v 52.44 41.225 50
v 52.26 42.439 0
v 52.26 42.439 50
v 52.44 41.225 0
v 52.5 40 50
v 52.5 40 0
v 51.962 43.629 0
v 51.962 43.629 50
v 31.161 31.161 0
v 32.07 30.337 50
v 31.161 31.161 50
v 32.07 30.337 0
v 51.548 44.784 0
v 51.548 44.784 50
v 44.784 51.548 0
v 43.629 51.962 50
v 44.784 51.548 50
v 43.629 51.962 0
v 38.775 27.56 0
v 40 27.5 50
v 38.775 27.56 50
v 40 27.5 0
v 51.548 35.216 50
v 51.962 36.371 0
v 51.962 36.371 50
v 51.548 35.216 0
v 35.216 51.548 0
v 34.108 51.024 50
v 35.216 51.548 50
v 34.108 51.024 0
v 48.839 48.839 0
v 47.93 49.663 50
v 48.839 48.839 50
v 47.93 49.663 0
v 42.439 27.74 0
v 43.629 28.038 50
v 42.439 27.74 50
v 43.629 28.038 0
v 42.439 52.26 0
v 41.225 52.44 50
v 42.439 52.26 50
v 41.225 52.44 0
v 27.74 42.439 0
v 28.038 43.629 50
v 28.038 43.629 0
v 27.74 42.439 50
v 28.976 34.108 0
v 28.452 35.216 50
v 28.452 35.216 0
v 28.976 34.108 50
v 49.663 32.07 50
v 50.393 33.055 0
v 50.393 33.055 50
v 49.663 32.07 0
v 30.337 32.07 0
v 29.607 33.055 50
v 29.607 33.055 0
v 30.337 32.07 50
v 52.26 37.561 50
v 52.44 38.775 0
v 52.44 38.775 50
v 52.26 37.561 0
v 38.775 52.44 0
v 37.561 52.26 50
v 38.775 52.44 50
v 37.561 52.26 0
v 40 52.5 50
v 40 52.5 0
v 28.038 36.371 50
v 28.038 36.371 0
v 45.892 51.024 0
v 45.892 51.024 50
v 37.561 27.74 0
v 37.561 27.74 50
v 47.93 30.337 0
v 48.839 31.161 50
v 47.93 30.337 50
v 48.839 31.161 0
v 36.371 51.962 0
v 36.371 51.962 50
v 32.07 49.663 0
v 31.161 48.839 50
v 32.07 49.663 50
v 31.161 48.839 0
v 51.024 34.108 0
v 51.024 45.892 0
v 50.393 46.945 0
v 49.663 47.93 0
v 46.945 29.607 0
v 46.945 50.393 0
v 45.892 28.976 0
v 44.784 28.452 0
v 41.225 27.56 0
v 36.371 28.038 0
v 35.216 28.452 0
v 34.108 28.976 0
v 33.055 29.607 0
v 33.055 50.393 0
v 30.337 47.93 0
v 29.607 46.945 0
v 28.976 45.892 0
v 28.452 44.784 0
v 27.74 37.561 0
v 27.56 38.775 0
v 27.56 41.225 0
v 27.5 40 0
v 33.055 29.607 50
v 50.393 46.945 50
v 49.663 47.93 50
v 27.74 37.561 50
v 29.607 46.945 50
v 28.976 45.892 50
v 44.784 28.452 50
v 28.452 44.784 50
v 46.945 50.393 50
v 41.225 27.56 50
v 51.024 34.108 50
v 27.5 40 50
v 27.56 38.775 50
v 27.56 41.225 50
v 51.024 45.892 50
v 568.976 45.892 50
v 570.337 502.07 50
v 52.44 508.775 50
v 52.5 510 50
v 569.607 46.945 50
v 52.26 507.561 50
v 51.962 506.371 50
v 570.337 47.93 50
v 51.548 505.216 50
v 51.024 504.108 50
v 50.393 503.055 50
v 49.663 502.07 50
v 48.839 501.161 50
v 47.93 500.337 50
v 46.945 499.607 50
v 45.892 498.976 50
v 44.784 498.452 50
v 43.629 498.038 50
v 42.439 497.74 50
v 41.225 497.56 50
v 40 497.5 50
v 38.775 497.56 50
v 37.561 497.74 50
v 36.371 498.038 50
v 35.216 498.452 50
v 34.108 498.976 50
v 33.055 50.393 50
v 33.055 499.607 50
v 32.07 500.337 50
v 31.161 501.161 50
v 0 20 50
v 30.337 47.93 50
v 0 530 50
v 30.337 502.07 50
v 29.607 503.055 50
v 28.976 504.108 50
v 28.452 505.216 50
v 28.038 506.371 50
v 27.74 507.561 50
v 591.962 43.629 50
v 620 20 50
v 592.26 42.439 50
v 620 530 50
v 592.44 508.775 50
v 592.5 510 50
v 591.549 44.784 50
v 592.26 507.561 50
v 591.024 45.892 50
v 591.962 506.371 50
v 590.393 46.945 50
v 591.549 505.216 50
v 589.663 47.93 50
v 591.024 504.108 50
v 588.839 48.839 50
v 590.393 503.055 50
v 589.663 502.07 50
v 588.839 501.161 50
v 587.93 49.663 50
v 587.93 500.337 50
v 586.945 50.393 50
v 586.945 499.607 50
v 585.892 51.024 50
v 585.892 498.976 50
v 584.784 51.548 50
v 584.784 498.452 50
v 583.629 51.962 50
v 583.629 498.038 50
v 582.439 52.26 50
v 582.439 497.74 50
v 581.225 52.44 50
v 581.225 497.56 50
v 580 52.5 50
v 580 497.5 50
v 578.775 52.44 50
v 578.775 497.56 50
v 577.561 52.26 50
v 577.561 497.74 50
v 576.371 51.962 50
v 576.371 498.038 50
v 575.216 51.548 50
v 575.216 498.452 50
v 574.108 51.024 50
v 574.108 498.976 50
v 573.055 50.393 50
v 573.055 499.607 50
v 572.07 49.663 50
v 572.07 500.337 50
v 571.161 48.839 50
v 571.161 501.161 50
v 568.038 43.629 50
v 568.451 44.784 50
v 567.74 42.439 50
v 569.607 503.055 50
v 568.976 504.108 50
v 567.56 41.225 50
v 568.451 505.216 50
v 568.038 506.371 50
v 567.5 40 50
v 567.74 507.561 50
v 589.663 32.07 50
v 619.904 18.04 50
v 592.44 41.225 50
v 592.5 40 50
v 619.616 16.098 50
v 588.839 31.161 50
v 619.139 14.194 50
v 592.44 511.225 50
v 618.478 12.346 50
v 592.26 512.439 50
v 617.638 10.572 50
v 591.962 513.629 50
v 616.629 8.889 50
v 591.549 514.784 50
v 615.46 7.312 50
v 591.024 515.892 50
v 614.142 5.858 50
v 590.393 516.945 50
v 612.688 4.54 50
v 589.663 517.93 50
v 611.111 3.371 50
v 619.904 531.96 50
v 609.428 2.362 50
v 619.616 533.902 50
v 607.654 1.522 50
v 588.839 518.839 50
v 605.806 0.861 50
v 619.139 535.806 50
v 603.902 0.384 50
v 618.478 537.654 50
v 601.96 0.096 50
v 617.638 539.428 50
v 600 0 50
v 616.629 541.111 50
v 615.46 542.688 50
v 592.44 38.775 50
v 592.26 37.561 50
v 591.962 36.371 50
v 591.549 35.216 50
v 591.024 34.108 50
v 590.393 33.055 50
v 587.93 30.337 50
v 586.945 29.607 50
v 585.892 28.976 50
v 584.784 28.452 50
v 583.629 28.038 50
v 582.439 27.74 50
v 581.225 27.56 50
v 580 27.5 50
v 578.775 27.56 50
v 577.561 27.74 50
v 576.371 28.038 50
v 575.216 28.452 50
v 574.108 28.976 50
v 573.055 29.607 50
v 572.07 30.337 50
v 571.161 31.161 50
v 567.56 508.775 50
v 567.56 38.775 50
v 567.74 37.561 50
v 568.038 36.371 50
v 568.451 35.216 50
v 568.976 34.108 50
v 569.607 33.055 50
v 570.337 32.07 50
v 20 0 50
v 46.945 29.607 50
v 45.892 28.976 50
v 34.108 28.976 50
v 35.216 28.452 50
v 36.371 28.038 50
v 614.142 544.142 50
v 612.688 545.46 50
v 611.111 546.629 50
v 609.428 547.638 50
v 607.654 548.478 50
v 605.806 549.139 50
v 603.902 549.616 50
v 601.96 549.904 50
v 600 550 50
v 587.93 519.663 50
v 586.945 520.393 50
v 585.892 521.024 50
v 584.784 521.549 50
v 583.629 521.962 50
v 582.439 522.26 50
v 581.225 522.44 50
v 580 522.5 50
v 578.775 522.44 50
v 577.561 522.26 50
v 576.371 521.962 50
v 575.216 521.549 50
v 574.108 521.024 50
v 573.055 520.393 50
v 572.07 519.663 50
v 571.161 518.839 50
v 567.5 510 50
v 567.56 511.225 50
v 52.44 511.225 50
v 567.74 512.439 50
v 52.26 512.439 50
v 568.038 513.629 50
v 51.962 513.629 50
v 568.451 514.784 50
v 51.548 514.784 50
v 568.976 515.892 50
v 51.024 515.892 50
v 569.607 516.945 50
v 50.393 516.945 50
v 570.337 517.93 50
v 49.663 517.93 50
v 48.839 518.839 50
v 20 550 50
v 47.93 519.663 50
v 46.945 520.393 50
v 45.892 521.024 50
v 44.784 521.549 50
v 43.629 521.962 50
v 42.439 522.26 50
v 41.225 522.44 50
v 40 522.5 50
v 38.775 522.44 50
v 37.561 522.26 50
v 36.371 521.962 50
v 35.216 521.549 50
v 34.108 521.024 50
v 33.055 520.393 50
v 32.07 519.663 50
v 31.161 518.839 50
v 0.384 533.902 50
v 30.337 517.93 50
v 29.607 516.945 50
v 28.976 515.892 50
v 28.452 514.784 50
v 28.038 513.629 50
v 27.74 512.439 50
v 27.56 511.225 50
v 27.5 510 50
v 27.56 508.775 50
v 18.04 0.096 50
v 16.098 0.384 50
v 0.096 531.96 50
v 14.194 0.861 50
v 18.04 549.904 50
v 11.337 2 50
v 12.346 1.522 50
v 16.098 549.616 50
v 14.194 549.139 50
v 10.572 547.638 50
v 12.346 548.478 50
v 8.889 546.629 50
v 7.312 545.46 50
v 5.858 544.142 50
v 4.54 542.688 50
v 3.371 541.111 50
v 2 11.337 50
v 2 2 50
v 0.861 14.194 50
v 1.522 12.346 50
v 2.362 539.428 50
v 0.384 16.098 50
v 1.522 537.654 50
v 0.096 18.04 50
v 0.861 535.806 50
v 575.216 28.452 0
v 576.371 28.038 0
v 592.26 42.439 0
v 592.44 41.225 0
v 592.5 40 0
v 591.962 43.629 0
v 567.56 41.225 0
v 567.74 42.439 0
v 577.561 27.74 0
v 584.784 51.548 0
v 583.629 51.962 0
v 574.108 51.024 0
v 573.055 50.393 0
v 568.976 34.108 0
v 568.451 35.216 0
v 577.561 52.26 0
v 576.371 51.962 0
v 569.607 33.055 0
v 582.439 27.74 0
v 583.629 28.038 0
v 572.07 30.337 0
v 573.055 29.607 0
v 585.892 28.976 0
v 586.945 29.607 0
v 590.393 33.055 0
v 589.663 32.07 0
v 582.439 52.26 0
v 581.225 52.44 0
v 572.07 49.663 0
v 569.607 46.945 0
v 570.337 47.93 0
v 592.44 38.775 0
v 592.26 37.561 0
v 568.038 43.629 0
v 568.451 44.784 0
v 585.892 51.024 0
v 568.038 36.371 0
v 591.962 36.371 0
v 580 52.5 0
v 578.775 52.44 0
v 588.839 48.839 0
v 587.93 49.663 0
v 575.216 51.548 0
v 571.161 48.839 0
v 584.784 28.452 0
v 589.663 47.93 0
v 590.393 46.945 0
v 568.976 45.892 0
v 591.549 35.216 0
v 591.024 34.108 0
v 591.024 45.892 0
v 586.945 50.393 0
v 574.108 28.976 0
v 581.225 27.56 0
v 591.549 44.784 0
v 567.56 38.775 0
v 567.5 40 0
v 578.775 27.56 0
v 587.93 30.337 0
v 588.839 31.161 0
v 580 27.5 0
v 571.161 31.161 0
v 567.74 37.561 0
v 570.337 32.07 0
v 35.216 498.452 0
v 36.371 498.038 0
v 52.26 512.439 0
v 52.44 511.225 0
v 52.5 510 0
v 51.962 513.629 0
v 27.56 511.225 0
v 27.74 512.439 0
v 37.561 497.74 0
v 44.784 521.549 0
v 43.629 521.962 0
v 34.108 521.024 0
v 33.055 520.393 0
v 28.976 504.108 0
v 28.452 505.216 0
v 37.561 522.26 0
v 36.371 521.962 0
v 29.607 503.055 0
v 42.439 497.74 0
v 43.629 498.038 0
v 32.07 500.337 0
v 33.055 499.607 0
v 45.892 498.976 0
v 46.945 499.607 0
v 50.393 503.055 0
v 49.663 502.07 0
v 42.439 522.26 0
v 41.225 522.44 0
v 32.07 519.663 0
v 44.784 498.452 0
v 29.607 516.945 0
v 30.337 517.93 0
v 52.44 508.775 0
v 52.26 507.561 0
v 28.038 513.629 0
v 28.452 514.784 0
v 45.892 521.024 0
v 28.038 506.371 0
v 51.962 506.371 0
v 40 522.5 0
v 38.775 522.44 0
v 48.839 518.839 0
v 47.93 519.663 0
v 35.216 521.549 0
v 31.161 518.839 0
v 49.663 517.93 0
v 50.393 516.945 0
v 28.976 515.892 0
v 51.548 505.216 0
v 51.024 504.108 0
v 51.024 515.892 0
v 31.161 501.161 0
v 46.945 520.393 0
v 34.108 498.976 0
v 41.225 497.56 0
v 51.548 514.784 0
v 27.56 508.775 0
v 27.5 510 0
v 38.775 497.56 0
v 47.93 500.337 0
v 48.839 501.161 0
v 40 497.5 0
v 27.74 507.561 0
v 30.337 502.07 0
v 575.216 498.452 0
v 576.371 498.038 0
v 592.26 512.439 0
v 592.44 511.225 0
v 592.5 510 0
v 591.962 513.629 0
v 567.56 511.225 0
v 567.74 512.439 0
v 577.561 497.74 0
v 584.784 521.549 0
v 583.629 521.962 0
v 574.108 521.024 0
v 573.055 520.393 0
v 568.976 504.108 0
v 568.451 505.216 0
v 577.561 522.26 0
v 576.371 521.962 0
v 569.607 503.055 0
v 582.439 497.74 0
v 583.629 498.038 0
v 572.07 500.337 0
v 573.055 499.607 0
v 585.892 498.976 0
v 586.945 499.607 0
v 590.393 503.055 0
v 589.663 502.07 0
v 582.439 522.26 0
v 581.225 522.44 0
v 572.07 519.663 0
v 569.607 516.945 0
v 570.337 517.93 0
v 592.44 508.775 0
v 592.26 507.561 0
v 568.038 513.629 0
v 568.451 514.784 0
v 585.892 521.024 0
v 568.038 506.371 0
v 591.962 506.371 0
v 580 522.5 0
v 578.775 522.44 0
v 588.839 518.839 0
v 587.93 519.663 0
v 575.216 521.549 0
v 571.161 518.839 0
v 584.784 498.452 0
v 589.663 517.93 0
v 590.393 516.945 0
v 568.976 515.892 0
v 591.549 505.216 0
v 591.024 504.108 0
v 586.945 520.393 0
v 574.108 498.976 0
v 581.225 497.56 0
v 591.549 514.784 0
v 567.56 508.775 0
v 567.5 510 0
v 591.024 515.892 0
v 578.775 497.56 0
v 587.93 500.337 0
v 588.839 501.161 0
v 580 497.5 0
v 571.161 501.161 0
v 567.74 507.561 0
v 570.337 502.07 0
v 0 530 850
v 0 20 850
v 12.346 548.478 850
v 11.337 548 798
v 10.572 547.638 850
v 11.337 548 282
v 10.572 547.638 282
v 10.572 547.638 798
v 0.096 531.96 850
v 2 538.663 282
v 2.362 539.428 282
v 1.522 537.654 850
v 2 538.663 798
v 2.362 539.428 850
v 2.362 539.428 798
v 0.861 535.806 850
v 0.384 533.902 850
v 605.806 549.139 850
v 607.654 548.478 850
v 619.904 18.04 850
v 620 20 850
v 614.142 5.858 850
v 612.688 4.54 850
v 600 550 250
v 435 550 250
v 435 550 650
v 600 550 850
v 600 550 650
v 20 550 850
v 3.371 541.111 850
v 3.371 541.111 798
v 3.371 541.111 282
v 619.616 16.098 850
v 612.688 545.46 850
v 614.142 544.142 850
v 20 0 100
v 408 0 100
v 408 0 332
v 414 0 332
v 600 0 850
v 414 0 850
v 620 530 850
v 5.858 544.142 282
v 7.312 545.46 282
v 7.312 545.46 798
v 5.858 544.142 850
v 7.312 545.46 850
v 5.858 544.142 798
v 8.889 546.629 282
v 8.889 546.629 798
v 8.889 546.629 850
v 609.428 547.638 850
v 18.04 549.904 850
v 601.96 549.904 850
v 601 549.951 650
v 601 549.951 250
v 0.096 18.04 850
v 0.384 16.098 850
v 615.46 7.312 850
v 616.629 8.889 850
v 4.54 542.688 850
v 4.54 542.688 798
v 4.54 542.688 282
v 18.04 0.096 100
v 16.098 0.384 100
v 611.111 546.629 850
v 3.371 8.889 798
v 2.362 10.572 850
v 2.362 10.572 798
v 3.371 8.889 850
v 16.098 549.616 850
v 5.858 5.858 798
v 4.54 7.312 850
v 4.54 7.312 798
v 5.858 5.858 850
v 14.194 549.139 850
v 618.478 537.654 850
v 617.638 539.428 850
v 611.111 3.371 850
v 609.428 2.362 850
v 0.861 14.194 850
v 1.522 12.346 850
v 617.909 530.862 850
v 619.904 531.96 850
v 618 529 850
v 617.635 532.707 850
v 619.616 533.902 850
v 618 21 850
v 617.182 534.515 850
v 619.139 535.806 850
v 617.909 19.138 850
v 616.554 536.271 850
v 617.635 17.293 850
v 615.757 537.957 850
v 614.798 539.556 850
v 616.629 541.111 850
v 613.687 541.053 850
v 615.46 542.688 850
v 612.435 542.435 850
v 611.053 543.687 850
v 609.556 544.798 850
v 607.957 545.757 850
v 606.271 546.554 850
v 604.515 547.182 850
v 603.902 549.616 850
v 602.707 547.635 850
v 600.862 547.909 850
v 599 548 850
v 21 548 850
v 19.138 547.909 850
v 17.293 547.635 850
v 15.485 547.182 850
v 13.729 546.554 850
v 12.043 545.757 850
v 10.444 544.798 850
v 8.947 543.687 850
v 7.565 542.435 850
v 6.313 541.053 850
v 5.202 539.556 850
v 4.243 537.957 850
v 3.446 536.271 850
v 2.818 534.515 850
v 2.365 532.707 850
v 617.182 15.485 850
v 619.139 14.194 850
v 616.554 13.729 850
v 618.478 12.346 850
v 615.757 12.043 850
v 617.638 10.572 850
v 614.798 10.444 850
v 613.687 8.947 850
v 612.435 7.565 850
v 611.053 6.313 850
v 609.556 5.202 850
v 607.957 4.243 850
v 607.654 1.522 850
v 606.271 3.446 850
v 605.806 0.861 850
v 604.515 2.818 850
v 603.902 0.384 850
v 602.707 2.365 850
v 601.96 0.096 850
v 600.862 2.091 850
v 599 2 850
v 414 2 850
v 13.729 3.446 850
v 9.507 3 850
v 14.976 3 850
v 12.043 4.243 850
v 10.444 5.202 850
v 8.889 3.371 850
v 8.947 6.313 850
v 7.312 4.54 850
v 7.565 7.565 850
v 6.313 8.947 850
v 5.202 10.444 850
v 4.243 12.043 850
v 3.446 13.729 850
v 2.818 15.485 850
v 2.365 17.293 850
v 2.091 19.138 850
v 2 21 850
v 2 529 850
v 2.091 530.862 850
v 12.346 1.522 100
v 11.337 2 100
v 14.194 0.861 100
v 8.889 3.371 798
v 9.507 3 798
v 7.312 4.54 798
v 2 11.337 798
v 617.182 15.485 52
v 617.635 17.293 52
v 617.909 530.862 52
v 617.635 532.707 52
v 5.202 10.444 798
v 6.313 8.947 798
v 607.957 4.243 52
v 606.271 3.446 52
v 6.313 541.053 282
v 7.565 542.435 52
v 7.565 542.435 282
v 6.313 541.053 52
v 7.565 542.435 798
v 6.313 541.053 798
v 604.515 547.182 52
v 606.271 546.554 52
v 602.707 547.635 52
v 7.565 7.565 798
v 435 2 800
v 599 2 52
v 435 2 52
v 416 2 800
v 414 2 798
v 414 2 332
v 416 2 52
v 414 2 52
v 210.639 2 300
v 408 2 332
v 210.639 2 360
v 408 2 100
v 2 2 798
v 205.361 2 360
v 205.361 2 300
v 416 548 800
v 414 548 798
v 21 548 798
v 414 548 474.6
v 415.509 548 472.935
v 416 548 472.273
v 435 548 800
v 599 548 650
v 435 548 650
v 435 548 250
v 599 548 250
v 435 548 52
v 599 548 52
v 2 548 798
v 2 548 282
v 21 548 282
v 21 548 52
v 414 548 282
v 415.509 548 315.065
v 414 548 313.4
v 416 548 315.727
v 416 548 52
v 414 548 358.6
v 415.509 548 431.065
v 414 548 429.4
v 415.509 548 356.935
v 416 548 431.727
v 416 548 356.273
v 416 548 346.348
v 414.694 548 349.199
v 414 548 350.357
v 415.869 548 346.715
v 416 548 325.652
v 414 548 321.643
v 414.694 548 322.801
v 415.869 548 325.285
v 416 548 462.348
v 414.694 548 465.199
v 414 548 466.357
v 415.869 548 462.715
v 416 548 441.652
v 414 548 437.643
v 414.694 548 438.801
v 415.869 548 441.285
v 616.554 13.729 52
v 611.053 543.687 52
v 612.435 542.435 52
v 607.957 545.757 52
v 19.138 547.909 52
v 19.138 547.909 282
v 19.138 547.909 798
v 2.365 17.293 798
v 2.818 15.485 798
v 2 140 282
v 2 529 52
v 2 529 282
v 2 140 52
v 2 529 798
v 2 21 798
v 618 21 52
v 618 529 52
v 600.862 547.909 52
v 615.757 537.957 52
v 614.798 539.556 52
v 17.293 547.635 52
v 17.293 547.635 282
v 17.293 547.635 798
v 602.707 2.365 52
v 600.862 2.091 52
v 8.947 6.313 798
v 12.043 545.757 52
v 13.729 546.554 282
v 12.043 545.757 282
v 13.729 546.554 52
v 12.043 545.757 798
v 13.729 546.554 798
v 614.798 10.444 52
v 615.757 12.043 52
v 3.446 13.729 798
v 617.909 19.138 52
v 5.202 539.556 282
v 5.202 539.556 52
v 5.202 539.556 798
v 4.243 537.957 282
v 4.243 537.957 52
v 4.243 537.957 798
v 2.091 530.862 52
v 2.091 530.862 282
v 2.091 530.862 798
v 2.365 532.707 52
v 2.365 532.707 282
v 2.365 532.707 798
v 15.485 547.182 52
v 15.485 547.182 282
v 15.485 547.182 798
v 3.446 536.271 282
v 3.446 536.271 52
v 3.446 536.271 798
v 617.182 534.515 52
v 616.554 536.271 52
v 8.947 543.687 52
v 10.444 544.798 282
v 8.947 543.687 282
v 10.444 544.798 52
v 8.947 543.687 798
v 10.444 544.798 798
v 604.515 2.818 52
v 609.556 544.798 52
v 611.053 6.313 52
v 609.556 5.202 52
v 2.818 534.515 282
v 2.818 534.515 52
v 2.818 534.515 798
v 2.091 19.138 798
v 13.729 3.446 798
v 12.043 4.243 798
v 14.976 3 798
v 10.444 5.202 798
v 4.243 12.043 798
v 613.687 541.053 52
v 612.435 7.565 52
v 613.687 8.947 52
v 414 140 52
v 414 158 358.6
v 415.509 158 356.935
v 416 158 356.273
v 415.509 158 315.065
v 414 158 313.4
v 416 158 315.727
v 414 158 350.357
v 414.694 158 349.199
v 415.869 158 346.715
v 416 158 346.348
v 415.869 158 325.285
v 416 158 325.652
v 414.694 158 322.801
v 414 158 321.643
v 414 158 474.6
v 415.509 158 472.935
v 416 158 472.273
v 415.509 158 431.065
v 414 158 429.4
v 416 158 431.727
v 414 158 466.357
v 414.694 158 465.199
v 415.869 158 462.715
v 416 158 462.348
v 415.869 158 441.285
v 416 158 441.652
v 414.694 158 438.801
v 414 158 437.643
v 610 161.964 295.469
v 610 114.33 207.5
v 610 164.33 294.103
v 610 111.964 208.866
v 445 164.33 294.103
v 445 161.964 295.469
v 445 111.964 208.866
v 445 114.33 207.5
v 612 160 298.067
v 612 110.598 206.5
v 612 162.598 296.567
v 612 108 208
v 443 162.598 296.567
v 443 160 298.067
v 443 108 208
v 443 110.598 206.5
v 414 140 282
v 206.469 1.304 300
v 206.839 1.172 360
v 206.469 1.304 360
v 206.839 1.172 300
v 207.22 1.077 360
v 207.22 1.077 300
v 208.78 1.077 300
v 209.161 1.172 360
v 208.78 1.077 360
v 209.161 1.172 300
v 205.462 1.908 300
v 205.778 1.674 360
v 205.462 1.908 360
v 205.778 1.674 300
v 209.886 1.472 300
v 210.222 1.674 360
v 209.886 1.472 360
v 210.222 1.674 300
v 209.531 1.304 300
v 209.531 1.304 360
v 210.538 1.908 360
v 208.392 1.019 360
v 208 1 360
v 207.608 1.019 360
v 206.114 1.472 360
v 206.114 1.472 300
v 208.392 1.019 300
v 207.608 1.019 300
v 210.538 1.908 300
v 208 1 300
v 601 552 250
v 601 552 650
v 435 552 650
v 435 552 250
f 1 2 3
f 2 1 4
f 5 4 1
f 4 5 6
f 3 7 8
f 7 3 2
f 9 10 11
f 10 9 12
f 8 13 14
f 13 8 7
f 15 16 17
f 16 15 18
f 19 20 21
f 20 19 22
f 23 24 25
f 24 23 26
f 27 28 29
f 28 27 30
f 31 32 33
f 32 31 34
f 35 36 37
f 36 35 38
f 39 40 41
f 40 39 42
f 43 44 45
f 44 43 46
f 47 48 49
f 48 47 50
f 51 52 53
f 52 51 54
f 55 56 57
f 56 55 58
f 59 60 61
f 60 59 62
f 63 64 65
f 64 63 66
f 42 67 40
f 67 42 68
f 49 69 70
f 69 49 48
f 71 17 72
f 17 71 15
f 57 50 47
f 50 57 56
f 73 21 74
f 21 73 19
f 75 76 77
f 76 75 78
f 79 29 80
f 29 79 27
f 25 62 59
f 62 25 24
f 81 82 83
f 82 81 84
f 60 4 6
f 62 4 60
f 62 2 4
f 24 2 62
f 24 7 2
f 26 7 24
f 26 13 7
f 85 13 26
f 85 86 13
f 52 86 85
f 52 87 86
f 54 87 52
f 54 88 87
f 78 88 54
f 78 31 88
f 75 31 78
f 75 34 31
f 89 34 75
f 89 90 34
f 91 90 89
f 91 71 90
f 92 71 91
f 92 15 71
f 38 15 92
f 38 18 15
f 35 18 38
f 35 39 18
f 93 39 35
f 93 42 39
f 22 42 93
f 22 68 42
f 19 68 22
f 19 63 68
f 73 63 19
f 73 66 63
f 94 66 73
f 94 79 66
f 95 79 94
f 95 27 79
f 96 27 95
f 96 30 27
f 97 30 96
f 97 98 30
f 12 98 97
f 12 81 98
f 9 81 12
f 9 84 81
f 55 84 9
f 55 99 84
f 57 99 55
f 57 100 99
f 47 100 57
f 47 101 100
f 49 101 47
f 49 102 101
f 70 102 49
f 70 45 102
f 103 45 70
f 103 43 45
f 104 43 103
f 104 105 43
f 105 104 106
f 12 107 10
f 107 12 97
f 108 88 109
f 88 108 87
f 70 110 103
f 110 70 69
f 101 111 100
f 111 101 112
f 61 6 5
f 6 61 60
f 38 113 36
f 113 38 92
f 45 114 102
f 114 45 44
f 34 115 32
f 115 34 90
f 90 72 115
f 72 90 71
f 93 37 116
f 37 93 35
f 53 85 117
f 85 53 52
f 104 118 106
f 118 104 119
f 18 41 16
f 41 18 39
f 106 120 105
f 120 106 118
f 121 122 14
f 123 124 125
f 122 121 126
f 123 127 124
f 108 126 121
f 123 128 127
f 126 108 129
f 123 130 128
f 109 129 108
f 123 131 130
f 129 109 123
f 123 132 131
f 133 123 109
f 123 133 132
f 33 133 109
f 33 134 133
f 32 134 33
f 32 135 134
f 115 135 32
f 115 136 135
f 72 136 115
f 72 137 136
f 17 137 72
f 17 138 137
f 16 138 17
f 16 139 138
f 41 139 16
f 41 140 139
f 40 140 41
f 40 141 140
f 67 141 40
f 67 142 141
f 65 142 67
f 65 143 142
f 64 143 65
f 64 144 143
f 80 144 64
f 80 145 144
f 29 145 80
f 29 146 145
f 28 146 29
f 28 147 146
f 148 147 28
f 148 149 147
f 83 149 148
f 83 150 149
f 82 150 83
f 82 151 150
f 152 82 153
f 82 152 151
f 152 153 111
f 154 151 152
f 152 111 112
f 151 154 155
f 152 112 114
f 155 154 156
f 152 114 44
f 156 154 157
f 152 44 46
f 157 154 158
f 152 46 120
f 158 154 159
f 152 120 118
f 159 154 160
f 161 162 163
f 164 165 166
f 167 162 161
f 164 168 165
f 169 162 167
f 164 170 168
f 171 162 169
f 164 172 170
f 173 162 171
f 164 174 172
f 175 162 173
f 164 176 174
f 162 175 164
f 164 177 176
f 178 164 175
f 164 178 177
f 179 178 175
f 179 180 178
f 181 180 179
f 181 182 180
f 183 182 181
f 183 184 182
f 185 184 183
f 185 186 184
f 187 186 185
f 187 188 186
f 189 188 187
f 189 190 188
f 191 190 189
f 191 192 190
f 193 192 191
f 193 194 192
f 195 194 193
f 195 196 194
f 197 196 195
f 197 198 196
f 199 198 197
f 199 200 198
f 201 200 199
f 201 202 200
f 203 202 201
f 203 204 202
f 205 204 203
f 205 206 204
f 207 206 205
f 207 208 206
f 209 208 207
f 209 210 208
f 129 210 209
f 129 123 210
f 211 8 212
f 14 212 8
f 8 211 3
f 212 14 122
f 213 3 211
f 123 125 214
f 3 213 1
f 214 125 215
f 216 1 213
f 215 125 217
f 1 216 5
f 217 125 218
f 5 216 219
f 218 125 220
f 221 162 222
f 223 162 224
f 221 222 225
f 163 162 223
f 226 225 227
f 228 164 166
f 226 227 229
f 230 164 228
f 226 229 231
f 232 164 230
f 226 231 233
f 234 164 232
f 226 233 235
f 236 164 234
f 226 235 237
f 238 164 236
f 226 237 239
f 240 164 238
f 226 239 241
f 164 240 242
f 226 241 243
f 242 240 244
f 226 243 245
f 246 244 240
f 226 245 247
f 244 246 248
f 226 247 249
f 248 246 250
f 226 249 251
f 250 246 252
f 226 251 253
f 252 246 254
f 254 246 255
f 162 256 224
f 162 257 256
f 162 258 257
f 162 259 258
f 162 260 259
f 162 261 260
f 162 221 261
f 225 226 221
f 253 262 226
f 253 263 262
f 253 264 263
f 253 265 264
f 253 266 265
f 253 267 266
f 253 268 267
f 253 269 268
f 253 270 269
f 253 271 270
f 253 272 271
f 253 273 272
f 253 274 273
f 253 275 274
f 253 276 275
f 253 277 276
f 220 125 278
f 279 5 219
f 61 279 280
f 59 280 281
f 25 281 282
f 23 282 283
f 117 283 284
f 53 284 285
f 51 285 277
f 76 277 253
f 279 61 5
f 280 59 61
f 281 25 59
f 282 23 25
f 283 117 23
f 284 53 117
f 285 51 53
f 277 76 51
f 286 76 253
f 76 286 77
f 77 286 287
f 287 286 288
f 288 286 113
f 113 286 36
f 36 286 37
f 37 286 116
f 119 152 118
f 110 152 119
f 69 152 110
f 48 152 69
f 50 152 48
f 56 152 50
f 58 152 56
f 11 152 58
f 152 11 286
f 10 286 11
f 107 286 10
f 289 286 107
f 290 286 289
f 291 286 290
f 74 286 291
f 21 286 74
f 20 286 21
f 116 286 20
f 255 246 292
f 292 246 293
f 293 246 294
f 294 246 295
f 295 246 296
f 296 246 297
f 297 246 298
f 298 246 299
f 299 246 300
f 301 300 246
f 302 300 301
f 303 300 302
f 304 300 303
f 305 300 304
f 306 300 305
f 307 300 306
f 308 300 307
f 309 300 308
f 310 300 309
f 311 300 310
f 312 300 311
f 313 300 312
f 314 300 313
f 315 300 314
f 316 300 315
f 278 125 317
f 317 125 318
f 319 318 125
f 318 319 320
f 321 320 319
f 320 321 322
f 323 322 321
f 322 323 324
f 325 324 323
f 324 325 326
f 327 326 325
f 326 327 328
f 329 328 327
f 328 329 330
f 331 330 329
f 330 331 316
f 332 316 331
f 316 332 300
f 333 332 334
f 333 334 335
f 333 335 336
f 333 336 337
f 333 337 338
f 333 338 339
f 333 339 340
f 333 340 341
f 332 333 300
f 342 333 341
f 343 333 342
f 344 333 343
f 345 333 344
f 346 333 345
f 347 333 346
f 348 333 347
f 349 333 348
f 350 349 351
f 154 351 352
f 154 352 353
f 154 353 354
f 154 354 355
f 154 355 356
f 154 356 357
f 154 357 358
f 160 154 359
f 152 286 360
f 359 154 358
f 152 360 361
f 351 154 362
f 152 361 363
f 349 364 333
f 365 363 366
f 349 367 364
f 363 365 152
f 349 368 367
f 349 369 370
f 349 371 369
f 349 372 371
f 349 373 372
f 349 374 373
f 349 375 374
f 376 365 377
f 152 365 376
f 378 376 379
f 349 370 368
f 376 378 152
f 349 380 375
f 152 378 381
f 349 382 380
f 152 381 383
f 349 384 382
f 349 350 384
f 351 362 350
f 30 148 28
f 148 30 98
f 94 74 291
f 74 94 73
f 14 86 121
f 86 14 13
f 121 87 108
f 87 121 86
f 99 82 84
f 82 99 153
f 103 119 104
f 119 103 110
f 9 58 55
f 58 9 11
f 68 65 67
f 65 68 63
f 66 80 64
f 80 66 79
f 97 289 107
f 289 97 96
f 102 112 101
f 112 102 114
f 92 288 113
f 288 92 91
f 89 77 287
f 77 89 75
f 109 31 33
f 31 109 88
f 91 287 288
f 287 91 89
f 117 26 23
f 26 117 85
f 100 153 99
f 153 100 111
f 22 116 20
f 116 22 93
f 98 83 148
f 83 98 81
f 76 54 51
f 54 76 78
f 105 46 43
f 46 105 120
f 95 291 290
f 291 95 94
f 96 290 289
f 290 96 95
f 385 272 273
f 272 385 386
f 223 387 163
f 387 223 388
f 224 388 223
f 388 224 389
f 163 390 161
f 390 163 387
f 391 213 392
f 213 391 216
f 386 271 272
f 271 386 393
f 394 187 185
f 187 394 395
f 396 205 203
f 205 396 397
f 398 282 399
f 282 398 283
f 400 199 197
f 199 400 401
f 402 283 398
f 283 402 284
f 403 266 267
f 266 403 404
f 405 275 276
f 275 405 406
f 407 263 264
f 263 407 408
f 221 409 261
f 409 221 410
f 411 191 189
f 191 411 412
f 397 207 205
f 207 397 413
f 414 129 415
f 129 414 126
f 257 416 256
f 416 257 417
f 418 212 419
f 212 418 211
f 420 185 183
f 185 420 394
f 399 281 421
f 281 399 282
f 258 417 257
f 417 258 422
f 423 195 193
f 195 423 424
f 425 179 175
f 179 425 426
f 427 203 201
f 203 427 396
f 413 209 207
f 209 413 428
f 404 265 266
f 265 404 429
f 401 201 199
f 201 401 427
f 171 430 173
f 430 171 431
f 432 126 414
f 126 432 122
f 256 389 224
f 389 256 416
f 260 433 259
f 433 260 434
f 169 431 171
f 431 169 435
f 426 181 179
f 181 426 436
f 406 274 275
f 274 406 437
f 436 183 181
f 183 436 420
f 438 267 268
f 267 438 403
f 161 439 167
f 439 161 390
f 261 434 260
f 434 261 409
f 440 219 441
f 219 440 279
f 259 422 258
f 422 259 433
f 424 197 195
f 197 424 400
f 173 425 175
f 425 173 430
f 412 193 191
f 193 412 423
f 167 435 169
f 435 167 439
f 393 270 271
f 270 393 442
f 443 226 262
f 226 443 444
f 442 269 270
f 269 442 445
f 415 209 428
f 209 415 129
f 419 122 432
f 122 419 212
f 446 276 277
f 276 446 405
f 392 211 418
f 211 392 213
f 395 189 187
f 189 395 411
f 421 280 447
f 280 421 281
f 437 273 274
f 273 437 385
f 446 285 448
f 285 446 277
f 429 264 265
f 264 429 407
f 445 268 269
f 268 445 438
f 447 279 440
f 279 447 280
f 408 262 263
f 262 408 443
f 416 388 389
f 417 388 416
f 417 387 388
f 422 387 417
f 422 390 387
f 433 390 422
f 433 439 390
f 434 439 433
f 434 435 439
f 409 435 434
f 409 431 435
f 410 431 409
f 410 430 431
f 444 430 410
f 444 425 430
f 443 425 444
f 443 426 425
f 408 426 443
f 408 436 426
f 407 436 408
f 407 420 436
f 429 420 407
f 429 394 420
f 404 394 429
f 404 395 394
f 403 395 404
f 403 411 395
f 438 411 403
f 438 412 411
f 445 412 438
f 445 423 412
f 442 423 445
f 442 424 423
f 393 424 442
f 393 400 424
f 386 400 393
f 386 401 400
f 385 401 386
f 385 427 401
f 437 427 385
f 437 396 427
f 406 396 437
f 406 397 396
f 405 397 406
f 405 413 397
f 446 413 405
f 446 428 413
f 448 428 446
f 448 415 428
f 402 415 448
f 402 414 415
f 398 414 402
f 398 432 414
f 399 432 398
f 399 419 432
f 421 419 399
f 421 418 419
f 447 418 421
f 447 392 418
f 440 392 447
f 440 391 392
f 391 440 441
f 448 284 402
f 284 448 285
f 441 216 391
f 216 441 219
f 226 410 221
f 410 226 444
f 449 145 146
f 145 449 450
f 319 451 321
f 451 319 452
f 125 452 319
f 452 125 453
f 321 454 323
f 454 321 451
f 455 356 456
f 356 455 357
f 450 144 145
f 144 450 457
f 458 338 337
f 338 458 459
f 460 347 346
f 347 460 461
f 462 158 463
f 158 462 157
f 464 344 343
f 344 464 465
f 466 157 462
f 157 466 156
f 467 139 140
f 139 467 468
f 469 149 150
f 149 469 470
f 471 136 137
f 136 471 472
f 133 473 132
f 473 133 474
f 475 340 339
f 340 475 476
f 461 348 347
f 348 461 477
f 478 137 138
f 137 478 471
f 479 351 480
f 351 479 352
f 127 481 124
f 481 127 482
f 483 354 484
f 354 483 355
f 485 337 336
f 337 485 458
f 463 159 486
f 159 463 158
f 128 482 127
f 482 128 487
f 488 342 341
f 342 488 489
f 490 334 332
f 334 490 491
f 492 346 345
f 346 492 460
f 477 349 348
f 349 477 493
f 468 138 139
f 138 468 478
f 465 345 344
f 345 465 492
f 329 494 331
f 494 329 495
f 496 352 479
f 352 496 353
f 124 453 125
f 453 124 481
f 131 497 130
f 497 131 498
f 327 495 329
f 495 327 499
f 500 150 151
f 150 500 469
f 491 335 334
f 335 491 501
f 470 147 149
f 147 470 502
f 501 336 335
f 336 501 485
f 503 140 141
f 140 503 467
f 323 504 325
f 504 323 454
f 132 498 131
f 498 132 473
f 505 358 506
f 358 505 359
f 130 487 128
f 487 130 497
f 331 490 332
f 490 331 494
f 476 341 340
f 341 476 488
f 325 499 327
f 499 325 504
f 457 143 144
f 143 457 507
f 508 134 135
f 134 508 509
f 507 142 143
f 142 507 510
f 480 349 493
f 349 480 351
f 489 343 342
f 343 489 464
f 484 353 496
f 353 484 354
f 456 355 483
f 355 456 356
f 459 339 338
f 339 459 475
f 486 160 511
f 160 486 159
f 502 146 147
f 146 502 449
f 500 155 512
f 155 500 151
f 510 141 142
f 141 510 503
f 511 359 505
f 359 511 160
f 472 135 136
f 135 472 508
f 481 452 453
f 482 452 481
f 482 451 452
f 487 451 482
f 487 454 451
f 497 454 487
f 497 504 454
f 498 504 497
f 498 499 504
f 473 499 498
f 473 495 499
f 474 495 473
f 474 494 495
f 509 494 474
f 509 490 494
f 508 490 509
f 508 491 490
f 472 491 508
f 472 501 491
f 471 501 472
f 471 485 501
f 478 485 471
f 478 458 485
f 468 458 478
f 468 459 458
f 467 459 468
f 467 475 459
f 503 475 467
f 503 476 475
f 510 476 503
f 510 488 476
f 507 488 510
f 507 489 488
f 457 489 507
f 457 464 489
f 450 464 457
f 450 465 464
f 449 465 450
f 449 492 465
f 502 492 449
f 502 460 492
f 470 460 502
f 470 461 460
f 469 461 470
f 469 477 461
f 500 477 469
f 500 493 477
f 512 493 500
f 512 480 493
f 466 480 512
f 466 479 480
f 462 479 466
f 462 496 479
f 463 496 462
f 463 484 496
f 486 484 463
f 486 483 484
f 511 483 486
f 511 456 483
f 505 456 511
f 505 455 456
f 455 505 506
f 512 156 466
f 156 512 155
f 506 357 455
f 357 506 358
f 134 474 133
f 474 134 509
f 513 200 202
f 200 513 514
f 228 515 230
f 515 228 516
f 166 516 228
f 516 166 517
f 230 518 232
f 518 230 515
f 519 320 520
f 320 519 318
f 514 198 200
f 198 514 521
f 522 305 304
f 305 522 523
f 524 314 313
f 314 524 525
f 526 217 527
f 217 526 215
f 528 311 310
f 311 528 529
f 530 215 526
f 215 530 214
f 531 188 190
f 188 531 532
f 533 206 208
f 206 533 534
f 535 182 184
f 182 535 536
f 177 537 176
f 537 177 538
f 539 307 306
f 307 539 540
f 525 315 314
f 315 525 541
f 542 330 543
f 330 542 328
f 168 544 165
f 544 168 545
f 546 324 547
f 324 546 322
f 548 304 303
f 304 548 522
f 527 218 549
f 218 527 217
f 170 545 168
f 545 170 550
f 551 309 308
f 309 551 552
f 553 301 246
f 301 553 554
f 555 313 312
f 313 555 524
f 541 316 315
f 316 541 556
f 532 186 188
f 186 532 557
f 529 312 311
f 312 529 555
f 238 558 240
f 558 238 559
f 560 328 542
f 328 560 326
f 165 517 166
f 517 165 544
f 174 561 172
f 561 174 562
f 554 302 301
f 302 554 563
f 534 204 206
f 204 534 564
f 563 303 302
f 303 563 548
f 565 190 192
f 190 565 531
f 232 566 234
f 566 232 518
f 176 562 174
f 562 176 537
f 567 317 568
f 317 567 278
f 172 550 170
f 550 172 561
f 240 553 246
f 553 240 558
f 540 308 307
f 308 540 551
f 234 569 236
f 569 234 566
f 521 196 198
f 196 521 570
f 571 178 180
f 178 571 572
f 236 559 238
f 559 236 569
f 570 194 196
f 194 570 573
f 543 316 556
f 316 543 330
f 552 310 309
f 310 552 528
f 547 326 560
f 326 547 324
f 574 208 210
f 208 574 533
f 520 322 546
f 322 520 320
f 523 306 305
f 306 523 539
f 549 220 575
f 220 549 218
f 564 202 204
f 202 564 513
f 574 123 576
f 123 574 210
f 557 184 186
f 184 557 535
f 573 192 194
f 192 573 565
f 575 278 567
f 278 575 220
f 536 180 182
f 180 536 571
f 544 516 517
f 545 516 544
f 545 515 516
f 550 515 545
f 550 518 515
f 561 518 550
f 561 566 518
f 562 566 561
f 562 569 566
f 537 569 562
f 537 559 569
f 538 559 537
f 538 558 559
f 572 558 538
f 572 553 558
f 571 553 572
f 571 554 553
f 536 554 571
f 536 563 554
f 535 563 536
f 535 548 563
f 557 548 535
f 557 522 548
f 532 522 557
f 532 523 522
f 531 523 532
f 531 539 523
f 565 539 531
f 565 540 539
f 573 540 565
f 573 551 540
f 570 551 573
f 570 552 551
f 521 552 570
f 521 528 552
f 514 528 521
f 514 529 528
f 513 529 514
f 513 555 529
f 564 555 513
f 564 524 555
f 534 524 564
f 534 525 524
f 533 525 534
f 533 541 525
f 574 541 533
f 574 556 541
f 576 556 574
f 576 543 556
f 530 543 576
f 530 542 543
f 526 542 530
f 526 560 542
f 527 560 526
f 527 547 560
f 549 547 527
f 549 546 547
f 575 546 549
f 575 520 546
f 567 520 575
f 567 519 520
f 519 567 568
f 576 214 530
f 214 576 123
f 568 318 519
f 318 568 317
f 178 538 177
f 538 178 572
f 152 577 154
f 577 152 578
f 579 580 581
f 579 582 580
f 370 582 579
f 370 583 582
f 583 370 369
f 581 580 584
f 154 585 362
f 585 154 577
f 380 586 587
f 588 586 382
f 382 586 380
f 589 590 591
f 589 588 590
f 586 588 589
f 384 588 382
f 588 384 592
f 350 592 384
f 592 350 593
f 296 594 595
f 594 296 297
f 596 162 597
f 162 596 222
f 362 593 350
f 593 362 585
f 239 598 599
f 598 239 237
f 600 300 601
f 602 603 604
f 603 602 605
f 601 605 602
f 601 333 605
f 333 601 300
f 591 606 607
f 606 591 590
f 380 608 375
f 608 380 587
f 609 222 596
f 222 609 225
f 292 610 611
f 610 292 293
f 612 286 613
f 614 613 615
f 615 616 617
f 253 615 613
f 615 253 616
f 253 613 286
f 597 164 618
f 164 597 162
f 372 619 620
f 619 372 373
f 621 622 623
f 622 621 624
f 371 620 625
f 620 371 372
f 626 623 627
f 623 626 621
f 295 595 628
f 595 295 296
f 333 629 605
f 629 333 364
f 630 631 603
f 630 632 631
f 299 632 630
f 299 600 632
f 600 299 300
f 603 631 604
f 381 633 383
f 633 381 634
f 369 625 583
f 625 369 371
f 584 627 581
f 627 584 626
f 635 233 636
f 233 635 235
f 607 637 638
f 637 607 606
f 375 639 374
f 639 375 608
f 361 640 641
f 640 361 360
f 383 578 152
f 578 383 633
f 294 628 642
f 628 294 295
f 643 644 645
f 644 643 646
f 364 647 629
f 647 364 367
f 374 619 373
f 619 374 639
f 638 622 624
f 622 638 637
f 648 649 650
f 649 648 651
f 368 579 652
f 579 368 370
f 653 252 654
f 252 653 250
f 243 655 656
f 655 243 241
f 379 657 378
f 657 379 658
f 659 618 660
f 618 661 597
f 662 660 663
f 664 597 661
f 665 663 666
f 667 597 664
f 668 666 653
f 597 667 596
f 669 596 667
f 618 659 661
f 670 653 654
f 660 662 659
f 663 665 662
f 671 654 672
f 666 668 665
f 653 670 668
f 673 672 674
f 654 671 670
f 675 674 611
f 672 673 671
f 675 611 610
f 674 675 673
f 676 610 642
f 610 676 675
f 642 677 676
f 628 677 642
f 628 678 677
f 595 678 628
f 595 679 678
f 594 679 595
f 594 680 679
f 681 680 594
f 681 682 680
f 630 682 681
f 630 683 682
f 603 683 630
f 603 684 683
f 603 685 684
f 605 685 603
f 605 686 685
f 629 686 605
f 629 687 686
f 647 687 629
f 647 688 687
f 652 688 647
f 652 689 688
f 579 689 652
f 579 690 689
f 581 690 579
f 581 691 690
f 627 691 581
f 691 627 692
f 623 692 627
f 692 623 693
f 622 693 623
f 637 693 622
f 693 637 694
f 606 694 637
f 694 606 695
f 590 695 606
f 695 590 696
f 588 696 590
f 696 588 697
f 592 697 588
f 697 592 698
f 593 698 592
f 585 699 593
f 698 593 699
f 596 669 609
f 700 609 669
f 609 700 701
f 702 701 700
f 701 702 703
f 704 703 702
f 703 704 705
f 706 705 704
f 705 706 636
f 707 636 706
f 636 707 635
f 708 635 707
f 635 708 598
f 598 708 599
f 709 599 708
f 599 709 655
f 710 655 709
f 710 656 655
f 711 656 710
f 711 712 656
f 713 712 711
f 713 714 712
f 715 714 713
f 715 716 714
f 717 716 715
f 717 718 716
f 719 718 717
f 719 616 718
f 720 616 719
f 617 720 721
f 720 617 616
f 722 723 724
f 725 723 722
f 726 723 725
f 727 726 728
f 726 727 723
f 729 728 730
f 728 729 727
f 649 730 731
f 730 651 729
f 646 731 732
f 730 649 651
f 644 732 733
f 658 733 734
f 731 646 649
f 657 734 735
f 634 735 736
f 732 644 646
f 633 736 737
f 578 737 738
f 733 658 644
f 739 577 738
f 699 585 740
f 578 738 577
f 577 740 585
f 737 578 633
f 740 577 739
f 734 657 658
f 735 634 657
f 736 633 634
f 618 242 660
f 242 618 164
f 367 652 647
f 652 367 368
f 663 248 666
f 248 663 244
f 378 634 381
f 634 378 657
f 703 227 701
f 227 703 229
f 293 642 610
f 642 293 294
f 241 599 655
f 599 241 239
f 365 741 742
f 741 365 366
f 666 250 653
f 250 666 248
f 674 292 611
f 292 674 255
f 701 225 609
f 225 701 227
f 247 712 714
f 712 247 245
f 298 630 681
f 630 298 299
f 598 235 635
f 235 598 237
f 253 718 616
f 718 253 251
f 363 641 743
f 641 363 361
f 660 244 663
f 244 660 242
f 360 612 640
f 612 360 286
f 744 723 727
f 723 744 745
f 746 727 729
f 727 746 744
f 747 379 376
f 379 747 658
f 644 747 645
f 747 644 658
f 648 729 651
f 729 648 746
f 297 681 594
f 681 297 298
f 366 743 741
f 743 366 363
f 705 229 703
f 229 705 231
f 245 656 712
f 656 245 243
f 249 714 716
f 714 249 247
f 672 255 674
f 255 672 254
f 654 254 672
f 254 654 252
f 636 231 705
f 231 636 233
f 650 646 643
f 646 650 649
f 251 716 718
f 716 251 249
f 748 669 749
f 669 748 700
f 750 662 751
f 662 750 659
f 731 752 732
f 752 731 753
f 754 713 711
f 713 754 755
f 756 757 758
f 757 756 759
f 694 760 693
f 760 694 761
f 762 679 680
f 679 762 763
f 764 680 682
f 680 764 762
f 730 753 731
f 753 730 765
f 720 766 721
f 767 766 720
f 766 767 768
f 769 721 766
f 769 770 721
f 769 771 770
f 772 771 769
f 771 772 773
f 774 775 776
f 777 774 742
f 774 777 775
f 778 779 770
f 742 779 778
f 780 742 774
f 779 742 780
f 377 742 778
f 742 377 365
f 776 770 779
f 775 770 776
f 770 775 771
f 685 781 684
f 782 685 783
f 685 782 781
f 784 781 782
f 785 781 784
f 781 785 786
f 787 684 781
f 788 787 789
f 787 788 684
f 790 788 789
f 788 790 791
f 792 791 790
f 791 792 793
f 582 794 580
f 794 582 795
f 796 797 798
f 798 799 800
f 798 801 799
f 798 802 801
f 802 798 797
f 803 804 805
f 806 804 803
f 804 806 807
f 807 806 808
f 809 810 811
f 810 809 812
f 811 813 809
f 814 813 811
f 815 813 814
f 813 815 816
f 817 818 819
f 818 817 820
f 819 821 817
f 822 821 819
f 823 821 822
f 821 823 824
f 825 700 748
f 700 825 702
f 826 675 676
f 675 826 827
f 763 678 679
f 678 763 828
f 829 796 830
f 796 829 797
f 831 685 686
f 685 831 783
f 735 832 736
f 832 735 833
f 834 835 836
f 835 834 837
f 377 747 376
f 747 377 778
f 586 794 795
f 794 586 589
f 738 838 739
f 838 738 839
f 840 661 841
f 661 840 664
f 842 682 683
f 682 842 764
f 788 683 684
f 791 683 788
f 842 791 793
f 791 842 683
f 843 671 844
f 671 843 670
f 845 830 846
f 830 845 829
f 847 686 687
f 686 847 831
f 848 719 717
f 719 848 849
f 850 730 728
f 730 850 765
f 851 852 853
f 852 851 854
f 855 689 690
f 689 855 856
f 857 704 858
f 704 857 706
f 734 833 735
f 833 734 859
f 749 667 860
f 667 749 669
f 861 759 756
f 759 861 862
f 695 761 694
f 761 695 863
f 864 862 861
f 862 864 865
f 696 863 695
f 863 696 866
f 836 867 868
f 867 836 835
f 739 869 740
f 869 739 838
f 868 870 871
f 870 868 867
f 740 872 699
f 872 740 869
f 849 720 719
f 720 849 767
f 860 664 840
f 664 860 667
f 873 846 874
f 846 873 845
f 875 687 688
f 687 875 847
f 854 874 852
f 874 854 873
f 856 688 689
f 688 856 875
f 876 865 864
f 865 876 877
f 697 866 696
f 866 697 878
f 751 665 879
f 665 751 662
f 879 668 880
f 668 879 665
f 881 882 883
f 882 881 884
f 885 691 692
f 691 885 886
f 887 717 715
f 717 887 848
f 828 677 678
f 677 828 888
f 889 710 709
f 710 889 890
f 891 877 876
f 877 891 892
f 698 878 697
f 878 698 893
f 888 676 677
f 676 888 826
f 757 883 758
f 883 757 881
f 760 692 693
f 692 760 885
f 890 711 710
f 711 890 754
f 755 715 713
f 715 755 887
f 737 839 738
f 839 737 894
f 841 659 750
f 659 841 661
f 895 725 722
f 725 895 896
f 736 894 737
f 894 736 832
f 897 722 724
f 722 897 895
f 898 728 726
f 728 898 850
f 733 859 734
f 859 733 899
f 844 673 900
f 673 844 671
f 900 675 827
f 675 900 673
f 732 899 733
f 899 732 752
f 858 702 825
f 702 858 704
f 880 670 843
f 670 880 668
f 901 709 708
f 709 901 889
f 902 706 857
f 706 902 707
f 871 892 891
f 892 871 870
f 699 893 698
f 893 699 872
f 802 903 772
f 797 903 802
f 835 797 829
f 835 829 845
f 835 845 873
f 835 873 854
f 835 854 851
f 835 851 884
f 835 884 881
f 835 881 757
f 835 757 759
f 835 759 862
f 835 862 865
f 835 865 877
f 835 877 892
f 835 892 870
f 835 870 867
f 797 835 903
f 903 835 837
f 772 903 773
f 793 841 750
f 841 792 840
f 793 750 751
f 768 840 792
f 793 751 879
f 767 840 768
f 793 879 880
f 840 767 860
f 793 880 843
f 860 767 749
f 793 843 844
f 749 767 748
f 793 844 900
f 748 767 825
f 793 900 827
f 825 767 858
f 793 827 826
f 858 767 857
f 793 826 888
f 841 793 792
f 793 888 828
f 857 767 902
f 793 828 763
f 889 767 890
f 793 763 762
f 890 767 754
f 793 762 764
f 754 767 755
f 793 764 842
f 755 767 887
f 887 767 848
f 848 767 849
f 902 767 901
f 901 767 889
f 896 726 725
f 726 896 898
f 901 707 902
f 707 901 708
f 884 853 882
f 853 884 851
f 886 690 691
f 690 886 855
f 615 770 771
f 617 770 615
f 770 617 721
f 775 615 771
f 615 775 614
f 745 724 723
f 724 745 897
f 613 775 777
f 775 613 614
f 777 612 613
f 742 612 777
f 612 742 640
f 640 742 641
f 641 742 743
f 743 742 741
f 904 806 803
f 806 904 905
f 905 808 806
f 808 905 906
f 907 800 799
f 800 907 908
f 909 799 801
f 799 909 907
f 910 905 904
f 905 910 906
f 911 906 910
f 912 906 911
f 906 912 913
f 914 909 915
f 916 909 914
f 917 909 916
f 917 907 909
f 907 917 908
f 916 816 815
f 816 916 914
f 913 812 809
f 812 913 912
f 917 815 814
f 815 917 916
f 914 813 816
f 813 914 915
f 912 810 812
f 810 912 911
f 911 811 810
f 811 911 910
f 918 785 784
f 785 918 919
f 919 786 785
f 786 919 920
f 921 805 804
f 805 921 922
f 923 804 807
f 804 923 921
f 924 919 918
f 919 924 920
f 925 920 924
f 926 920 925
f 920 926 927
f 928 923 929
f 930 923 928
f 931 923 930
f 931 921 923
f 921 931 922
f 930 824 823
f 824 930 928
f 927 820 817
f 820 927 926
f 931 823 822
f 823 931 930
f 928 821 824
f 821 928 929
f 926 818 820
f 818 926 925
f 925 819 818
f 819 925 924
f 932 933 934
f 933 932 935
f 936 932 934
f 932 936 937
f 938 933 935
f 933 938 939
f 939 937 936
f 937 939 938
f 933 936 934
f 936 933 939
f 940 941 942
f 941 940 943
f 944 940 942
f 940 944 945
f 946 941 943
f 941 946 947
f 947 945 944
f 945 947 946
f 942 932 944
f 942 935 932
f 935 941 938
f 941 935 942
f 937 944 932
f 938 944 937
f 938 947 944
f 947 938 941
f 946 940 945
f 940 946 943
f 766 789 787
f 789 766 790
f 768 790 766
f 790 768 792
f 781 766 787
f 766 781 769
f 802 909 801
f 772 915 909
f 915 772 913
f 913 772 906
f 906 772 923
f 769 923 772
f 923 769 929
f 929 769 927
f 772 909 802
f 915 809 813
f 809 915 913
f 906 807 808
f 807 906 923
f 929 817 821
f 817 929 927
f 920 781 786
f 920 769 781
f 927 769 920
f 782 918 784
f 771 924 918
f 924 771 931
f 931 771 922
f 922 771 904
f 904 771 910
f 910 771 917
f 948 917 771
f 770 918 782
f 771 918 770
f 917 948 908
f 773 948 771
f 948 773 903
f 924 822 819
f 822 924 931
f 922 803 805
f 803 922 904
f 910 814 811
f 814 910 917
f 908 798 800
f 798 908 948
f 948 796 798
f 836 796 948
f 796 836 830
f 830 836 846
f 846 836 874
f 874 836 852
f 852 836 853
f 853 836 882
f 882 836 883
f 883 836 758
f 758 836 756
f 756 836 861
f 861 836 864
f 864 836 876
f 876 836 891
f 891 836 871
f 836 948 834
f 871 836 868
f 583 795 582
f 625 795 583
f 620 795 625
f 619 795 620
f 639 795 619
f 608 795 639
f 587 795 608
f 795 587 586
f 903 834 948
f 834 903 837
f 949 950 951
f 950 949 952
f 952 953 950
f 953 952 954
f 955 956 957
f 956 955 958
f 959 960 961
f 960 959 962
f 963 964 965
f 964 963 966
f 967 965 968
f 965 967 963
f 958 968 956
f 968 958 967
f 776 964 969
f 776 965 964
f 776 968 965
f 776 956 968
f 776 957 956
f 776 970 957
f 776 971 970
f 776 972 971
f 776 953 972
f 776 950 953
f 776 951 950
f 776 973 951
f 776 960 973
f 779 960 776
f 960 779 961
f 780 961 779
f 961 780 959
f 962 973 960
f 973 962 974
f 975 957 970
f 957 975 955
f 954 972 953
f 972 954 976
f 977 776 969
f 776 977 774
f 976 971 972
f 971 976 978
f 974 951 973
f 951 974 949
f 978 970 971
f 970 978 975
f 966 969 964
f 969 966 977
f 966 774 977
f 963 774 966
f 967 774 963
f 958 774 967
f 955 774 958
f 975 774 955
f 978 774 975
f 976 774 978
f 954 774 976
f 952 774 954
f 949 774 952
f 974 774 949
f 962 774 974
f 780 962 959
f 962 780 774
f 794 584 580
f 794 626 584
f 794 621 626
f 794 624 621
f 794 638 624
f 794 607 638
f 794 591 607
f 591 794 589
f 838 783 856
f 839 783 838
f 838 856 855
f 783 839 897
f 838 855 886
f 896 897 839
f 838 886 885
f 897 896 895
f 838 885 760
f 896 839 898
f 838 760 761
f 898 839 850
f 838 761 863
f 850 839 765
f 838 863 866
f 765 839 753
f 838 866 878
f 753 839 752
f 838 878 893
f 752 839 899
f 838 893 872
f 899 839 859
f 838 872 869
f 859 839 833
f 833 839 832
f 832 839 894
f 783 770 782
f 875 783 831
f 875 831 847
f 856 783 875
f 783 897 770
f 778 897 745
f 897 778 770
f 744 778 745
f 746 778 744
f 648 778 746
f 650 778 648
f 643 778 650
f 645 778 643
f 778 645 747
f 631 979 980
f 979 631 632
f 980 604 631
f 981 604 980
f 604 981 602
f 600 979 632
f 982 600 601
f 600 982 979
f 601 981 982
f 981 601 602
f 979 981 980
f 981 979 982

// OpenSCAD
// VM-01 Base Vending Machine
// Janis Product Design
// Version: v3
// Date: 2026-06-27
// Units: mm

$fn = 64;

// ─────────────────────────────
// PARAMETERS
// ─────────────────────────────

total_w = 620;
total_h = 800;
total_d = 550;
corner_r = 20;
skin_t = 2;

// Legs
leg_h = 50;
leg_od = 25;
leg_inset = 40;

// Compartments
product_w = 416;
system_w = 185;
divider_t = 19;

// Spring/Tray
spring_od = 66;
spring_l = 390;
motor_d = 20;
spring_gap = 20;
spring_lanes = 5;
tray_count = 2;
tray_h = 116;
tray_wall = 3;
partition_h = 40;

// Zones from inside floor
drop_zone_d = 138;  // front of machine
tray_start_d = drop_zone_d; // tray starts behind drop zone

// Exit door
exit_door_h = 250;
exit_door_w = 400;
exit_door_from_floor = 0; // at base of product zone

// Heights from ground
product_zone_floor = leg_h;
tray_zone_floor = leg_h;
tray_zone_h = tray_h * tray_count;

// Screen
screen_angle = 30;
screen_w = 165;
screen_h = 100;
screen_top_pct = 0.4;

// IR sensor
sensor_d = 15;
sensor_h = 8;
sensor_gap = 10; // from tray bottom

// Flap
flap_t = 3;
flap_h = exit_door_h;
flap_w = exit_door_w;

// Lock rod
rod_d = 8;
rod_h = 60;

// ─────────────────────────────
// MODULES
// ─────────────────────────────

module rounded_box(w, h, d, r) {
    hull() {
        translate([r, r, 0])
            cylinder(r=r, h=h);
        translate([w-r, r, 0])
            cylinder(r=r, h=h);
        translate([r, d-r, 0])
            cylinder(r=r, h=h);
        translate([w-r, d-r, 0])
            cylinder(r=r, h=h);
    }
}

module leg() {
    color("#AAAAAA")
    cylinder(h=leg_h, d=leg_od);
}

module legs() {
    positions = [
        [leg_inset, leg_inset],
        [total_w-leg_inset, leg_inset],
        [leg_inset, total_d-leg_inset],
        [total_w-leg_inset, total_d-leg_inset]
    ];
    for (p = positions)
        translate([p[0], p[1], 0])
            leg();
}

module spring_coil() {
    color("#888888")
    difference() {
        cylinder(h=spring_l, d=spring_od);
        cylinder(h=spring_l+1, d=spring_od-10);
    }
}

module spring_tray(tray_num) {
    tray_w = product_w - 20;
    tray_d = spring_l + motor_d;
   z = leg_h + exit_door_h + (tray_num * tray_h);

    translate([10, tray_start_d, z]) {
        
        // Tray body
        color("#CCCCCC")
        difference() {
            cube([tray_w, tray_d, tray_h]);
            translate([tray_wall, tray_wall, tray_wall])
                cube([tray_w-(tray_wall*2),
                      tray_d-(tray_wall*2),
                      tray_h+1]);
        }

        // Springs + motors + partitions
        for (i = [0:spring_lanes-1]) {
            x = tray_wall + spring_od/2 +
                i*(spring_od + spring_gap);

            // Motor at back
            color("#555555")
            translate([x-10, 0, tray_wall])
                cube([20, motor_d, 30]);

            // Spring along Y (back to front)
            color("#999999")
            translate([x,
                       motor_d + spring_l,
                       tray_wall + spring_od/2])
                rotate([90, 0, 0])
                    spring_coil();

            // Lane partitions
            if (i < spring_lanes-1) {
                color("#BBBBBB")
                translate([x + spring_od/2 +
                           spring_gap/2,
                           tray_wall, tray_wall])
                    cube([2,
                          tray_d-(tray_wall*2),
                          partition_h]);
            }
        }
    }
}

module outer_shell() {
    color("#C8C8C8", 0.75)
    difference() {
        rounded_box(total_w, total_h, total_d, corner_r);

        // Hollow interior
        translate([skin_t, skin_t, skin_t])
            rounded_box(
                total_w-(skin_t*2),
                total_h,
                total_d-(skin_t*2),
                corner_r-1);

        // Main front door cutout (left product zone)
        translate([skin_t, -1, leg_h + tray_zone_h])
            cube([product_w-(skin_t*2),
                  skin_t+2,
                  total_h - leg_h - tray_zone_h]);

        // Exit door cutout (front face, base of product zone)
        translate([(product_w - exit_door_w)/2,
                   -1,
                   leg_h])
            cube([exit_door_w,
                  skin_t+2,
                  exit_door_h]);
    }
}

module compartment_divider() {
    color("#AAAAAA", 0.9)
    translate([product_w, skin_t, leg_h])
        cube([divider_t,
              total_d-(skin_t*2),
              total_h-leg_h]);
}

// IR sensor pair on side walls
module ir_sensors() {
    sensor_z = leg_h + tray_h - sensor_gap - sensor_h;
    
    // Left sensor
    color("#222222")
    translate([skin_t + 5,
               skin_t + drop_zone_d/2,
               sensor_z])
        cube([sensor_d, sensor_h, sensor_h]);

    // Right sensor (pair)
    color("#222222")
    translate([product_w - skin_t - 5 - sensor_d,
               skin_t + drop_zone_d/2,
               sensor_z])
        cube([sensor_d, sensor_h, sensor_h]);

    // IR beam line (visual only)
    color("#FF0000", 0.3)
    translate([skin_t + 5 + sensor_d,
               skin_t + drop_zone_d/2 + sensor_h/2,
               sensor_z + sensor_h/2])
        cube([product_w - (skin_t*2) - 10 - (sensor_d*2),
              1, 1]);
}

// Flap door (shown closed)
module flap_door() {
    color("#B0B0B0", 0.9)
    translate([(product_w - flap_w)/2,
               skin_t,
               leg_h])
        cube([flap_w, flap_t, flap_h]);
}

// Lock rod (connects flap to top acrylic lock)
module lock_rod() {
    color("#666666")
    translate([product_w/2,
               skin_t + flap_t,
               leg_h + flap_h])
        cylinder(h=rod_h, d=rod_d);
}

module screen_mount() {
    screen_z = leg_h + (total_h * screen_top_pct * 0.5);
    color("#1A1A1A")
    translate([product_w + divider_t + 10,
               total_d * 0.2,
               screen_z])
        rotate([-screen_angle, 0, 0])
            cube([screen_w, 5, screen_h]);
    
    // Screen bezel
    color("#333333", 0.8)
    translate([product_w + divider_t + 8,
               total_d * 0.2 - 2,
               screen_z - 2])
        rotate([-screen_angle, 0, 0])
            cube([screen_w+4, 3, screen_h+4]);
}

module acrylic_panel() {
    acrylic_z = leg_h + tray_zone_h;
    acrylic_h = total_h - acrylic_z - skin_t;

    color("#ADD8E6", 0.2)
    translate([skin_t, skin_t, acrylic_z])
        cube([product_w-(skin_t*2),
              total_d-(skin_t*2),
              acrylic_h]);
}

module drop_zone_visual() {
    color("#F0F0F0", 0.15)
    translate([skin_t, skin_t, leg_h])
        cube([product_w-(skin_t*2),
              drop_zone_d,
              tray_zone_h]);
}

module rear_service_door() {
    door_w = system_w - divider_t;
    door_h = total_h * 0.5;
    color("#B8B8B8", 0.6)
    translate([product_w + divider_t,
               total_d - skin_t,
               leg_h + (total_h*0.25)])
        cube([door_w, skin_t*2, door_h]);
}

// ─────────────────────────────
// ASSEMBLY
// ─────────────────────────────

// Legs
legs();

// Main shell
translate([0, 0, leg_h])
    outer_shell();

// Internal divider
compartment_divider();

// Spring trays (tray 0 = bottom, tray 1 = top)
for (t = [0:tray_count-1])
    spring_tray(t);

// Drop zone visual guide
drop_zone_visual();

// IR sensors
ir_sensors();

// Flap exit door
flap_door();

// Lock rod
lock_rod();

// Screen + bezel
screen_mount();

// Acrylic display panel
acrylic_panel();

// Rear service door
rear_service_door();
